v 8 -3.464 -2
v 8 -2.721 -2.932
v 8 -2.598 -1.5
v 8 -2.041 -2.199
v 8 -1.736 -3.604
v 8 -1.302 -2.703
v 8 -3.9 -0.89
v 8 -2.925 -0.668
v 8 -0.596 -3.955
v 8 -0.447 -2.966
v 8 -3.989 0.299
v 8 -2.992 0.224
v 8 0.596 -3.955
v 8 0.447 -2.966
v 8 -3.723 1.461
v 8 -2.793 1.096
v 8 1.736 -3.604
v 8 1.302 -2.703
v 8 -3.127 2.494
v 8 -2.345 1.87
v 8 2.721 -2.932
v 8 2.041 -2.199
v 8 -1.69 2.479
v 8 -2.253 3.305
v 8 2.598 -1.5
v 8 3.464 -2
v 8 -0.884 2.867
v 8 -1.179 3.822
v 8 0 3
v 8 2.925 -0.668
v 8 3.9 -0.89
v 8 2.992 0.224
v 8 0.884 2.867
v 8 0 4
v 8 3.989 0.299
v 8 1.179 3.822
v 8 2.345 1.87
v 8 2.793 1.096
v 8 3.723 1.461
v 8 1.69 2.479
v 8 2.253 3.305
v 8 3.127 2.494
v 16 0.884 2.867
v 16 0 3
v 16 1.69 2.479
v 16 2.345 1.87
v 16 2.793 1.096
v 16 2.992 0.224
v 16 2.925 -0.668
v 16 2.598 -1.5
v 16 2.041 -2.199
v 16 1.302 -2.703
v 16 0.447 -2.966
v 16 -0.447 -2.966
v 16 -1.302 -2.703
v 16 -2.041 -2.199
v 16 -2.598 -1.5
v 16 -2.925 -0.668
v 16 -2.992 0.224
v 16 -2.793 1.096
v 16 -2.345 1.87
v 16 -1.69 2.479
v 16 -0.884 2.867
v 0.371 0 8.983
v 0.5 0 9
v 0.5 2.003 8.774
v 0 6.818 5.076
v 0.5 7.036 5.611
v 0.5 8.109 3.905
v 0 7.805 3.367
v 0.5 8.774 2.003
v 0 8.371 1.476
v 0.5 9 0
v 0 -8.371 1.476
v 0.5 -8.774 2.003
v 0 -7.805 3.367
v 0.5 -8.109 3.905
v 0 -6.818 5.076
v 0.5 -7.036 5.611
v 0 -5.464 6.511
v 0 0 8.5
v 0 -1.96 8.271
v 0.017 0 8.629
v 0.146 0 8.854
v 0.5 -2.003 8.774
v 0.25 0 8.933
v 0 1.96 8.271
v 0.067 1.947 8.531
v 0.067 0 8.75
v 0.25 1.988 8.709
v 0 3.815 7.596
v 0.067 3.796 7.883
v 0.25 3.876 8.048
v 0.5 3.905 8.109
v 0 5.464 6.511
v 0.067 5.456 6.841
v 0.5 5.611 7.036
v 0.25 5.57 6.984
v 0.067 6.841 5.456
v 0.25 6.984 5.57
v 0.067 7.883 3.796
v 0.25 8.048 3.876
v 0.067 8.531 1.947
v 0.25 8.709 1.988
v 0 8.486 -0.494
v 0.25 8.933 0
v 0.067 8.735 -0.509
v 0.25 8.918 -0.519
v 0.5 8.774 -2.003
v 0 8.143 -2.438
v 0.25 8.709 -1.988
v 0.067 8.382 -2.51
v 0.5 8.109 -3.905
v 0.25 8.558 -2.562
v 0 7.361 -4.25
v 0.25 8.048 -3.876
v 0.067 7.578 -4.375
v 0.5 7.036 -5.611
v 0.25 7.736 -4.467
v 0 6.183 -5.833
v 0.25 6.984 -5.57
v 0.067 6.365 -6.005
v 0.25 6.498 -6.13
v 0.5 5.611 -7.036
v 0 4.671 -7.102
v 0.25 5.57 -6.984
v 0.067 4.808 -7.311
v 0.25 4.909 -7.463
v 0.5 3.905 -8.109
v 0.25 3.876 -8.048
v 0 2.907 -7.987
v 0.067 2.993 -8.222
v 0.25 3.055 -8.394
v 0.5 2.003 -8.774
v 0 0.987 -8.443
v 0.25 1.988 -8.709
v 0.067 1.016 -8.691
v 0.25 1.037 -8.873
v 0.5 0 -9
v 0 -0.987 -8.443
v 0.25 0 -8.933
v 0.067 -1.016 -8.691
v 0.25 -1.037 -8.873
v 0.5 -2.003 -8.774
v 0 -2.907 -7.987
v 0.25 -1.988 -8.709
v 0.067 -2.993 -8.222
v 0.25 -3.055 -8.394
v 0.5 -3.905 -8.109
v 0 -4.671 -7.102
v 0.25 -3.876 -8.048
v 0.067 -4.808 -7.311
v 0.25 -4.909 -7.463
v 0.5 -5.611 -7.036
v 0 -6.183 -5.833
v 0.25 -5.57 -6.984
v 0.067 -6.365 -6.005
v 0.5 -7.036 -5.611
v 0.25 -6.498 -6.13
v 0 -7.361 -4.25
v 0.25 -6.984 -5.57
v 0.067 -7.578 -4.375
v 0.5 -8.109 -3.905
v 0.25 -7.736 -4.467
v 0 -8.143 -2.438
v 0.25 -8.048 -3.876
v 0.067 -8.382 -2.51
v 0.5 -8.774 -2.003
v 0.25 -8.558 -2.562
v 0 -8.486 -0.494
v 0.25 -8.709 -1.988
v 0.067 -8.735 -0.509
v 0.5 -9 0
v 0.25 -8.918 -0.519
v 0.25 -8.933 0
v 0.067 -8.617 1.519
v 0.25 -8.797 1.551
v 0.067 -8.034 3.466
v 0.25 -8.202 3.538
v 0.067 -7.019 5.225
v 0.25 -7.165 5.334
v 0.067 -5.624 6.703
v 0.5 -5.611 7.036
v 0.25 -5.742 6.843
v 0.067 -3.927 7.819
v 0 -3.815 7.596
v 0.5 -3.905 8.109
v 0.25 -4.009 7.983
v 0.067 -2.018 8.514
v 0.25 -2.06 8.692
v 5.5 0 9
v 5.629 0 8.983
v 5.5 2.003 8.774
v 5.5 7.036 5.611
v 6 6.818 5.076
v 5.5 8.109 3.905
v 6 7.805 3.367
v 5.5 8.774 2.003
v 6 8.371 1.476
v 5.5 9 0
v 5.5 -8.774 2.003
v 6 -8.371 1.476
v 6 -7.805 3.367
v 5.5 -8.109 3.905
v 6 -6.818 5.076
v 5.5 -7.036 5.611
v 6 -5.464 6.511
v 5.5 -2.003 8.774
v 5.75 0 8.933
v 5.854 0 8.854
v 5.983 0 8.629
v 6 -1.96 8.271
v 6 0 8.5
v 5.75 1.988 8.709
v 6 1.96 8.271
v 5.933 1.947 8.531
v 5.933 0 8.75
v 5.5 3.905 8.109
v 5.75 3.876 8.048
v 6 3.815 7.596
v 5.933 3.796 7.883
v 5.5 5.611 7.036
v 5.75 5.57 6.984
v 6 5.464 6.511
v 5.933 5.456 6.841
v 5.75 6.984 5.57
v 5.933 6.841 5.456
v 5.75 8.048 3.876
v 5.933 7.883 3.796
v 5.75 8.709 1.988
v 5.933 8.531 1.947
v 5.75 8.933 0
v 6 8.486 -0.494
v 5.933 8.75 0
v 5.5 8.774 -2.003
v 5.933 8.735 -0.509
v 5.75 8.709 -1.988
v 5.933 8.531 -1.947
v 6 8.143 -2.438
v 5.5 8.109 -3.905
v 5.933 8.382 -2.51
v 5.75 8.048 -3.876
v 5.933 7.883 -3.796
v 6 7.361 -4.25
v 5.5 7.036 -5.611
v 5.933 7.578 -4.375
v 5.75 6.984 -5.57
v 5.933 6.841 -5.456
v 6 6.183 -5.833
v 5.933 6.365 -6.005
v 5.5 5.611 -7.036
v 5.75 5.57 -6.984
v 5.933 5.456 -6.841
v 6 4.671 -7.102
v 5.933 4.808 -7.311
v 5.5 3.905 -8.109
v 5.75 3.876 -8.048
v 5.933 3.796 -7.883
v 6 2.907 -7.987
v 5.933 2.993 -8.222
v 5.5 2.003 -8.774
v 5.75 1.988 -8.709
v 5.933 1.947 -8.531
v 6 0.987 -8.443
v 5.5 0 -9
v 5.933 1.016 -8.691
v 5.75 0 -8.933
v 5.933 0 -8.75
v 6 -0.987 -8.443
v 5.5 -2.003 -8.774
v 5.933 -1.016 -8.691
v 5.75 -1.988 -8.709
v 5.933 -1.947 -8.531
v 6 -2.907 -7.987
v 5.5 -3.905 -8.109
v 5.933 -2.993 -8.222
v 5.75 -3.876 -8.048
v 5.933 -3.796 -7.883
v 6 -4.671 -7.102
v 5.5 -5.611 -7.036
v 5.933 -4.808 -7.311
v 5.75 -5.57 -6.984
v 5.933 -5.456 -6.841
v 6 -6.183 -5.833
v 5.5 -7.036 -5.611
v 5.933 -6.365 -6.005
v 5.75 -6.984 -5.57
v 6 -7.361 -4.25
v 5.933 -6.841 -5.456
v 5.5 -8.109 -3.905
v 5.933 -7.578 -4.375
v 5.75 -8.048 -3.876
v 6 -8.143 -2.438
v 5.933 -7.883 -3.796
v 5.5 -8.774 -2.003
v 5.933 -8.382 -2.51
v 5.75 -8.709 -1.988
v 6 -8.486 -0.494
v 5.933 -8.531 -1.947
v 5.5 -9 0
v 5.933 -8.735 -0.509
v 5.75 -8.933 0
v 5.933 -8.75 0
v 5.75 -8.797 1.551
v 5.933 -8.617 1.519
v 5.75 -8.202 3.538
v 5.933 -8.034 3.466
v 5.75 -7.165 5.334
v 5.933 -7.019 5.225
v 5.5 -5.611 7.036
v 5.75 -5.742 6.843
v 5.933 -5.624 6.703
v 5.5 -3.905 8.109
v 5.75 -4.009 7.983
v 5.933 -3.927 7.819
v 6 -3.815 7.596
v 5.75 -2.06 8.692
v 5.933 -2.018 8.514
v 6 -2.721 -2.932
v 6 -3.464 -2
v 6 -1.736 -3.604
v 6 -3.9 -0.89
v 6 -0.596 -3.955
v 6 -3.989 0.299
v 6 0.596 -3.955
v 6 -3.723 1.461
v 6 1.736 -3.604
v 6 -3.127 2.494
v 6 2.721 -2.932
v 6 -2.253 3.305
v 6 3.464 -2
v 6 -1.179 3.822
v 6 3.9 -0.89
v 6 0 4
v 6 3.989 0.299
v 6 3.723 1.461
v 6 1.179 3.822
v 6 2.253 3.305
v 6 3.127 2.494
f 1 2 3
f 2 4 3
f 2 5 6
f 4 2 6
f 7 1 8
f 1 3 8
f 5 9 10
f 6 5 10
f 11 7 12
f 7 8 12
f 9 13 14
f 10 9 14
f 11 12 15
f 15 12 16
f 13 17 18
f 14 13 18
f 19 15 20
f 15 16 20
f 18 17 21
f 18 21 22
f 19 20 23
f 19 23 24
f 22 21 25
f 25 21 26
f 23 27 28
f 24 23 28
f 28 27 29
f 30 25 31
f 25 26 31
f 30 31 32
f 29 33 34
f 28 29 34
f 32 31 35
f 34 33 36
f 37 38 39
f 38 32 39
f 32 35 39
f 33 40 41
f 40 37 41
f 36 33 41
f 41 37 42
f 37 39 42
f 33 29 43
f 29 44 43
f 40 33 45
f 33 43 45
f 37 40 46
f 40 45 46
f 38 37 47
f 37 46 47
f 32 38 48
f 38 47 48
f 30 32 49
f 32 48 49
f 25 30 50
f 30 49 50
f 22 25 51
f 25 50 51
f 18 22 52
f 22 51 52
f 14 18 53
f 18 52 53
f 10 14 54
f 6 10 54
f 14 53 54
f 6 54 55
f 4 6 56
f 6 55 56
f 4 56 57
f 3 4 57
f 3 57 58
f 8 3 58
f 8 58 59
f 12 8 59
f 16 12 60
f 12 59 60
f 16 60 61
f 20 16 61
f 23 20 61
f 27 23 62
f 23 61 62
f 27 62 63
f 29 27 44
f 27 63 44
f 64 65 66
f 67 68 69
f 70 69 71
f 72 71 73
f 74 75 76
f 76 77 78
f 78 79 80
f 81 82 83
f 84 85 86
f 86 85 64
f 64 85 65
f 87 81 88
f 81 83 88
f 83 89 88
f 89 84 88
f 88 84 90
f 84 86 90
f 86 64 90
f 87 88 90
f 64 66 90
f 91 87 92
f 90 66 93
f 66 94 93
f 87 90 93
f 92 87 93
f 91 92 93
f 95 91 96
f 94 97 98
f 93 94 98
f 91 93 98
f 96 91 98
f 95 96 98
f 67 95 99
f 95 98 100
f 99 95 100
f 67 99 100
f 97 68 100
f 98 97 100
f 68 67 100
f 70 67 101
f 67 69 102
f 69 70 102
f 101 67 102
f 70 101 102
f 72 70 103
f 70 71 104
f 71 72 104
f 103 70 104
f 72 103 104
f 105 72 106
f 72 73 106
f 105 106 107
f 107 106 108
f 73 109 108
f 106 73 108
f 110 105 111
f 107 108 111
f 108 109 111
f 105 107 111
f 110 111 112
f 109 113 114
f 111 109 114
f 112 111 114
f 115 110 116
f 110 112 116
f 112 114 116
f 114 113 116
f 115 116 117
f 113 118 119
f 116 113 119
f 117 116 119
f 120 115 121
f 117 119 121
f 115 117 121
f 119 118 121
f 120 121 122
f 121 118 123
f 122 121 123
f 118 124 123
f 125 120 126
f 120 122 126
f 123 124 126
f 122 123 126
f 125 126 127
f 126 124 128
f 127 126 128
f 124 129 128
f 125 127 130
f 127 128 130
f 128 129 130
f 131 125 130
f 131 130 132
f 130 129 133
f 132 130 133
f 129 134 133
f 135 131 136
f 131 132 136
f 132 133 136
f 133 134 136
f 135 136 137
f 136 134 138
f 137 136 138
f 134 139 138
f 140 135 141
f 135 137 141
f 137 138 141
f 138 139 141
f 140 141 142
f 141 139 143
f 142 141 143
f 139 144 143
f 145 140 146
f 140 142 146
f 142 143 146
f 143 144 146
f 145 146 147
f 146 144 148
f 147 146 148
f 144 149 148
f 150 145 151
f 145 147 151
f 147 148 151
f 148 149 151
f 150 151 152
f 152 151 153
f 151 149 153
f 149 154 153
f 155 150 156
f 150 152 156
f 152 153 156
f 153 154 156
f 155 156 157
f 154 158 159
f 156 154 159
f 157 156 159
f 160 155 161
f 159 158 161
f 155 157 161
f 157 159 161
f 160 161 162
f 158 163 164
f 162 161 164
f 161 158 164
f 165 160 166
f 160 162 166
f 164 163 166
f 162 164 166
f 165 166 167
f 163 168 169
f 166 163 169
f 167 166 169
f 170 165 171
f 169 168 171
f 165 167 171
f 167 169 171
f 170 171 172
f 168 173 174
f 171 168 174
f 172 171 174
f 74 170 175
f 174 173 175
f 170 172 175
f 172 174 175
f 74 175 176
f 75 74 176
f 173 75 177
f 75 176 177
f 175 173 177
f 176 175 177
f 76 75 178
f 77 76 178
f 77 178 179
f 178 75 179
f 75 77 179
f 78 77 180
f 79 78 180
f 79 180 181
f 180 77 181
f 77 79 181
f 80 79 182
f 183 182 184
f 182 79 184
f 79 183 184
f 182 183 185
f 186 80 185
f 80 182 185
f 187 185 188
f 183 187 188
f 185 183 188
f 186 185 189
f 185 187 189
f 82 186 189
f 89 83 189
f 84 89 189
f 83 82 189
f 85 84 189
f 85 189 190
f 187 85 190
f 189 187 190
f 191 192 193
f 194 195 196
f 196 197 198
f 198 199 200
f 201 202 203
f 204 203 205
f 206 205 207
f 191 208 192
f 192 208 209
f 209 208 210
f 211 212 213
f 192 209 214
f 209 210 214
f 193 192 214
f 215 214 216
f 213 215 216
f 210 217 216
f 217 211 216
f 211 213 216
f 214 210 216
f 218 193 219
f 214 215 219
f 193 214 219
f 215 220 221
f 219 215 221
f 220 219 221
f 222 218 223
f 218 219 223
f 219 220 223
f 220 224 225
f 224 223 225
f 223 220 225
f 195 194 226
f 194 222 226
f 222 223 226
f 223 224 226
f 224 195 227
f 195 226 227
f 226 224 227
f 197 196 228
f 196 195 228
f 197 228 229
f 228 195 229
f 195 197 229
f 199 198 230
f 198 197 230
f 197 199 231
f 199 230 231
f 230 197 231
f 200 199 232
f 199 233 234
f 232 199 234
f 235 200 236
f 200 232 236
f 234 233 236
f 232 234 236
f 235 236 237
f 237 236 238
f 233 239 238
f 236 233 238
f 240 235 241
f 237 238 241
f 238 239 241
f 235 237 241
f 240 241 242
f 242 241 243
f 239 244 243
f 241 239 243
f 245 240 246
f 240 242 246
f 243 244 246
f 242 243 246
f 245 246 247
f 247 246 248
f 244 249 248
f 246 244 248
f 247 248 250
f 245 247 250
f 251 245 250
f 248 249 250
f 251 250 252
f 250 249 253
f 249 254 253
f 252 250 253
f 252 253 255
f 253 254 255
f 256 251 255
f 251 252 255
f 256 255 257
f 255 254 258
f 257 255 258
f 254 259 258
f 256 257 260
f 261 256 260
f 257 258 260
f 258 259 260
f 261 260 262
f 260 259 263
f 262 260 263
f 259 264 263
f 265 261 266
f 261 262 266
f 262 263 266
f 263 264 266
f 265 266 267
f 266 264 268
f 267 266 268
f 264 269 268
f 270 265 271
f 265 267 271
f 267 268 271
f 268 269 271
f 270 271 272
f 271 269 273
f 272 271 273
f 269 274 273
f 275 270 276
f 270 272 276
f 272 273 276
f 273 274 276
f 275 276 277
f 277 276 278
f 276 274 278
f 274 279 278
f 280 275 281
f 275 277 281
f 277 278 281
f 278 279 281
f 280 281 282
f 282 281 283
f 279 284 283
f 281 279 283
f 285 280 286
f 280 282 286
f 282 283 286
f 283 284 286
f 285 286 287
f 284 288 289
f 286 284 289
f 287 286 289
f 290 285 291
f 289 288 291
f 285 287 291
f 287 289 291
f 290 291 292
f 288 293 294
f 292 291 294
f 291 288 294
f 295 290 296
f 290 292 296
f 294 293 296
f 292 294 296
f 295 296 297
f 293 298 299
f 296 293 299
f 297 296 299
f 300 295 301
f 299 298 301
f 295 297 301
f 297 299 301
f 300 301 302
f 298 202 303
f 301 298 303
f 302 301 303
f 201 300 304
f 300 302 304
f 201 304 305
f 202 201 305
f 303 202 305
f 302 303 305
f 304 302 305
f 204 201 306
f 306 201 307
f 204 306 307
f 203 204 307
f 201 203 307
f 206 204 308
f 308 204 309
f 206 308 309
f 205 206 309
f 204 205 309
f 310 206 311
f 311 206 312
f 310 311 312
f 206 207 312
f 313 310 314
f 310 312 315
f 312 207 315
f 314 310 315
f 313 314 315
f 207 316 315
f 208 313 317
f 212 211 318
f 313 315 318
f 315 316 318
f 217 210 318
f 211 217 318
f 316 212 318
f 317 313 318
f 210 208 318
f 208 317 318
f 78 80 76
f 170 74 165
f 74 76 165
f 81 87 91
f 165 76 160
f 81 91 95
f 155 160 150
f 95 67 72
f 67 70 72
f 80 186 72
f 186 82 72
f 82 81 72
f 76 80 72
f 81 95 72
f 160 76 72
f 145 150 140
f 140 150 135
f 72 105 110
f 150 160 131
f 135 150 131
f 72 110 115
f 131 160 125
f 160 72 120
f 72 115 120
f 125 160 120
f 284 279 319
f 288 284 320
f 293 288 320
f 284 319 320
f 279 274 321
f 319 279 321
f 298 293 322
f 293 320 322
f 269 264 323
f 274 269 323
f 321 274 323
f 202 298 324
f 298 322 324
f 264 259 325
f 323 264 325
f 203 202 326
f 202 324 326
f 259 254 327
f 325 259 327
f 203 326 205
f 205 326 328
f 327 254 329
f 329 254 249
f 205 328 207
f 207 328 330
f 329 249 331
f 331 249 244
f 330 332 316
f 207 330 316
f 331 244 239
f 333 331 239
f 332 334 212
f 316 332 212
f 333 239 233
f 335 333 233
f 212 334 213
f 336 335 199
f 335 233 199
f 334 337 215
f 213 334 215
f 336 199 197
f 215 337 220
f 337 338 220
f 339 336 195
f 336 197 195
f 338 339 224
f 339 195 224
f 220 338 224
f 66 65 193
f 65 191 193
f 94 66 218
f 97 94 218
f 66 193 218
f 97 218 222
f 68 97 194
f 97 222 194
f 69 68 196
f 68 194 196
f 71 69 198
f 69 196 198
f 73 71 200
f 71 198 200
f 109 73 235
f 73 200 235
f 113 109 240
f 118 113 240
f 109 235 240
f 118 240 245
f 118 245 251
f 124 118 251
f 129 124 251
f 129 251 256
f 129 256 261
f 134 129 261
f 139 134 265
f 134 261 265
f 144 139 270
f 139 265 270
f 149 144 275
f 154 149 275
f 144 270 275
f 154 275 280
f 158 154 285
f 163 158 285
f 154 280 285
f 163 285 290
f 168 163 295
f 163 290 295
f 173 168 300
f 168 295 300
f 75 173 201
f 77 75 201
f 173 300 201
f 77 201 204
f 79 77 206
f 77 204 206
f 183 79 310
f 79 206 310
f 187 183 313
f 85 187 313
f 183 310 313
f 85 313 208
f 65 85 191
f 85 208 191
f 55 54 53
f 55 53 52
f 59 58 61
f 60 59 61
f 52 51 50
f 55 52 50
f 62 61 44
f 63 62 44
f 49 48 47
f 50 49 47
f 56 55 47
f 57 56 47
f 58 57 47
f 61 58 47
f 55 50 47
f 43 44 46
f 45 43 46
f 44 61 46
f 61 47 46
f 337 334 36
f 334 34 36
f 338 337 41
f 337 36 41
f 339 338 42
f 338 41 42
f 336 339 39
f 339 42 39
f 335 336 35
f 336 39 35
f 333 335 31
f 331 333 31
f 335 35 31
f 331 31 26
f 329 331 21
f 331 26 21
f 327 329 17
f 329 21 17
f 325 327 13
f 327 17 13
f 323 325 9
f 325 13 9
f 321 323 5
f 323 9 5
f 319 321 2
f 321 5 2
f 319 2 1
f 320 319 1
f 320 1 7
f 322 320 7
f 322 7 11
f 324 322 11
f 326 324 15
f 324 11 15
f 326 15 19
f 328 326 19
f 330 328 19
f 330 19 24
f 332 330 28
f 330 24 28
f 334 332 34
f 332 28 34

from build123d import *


with BuildPart() as part:
    # 草图1 → 旋转1 (revolve)
    with BuildSketch(Plane(origin=(0, 0, 0), x_dir=(1, 0, 0), z_dir=(0, 1, 0))):
        with BuildLine():
            Line((0, 0), (0, -8.5))
            ThreePointArc((0, -8.5), (0.146446609, -8.853553391), (0.5, -9))
            Line((0.5, -9), (5.5, -9))
            ThreePointArc((5.5, -9), (5.853553391, -8.853553391), (6, -8.5))
            Line((6, -8.5), (6, -4))
            Line((6, -4), (8, -4))
            Line((8, -4), (8, -3))
            Line((8, -3), (16, -3))
            Line((16, -3), (16, 0))
            Line((16, 0), (0, 0))
        make_face()
    revolve(axis=Axis((16, 0, 0), (-1, 0, 0)))


solid = part.part
